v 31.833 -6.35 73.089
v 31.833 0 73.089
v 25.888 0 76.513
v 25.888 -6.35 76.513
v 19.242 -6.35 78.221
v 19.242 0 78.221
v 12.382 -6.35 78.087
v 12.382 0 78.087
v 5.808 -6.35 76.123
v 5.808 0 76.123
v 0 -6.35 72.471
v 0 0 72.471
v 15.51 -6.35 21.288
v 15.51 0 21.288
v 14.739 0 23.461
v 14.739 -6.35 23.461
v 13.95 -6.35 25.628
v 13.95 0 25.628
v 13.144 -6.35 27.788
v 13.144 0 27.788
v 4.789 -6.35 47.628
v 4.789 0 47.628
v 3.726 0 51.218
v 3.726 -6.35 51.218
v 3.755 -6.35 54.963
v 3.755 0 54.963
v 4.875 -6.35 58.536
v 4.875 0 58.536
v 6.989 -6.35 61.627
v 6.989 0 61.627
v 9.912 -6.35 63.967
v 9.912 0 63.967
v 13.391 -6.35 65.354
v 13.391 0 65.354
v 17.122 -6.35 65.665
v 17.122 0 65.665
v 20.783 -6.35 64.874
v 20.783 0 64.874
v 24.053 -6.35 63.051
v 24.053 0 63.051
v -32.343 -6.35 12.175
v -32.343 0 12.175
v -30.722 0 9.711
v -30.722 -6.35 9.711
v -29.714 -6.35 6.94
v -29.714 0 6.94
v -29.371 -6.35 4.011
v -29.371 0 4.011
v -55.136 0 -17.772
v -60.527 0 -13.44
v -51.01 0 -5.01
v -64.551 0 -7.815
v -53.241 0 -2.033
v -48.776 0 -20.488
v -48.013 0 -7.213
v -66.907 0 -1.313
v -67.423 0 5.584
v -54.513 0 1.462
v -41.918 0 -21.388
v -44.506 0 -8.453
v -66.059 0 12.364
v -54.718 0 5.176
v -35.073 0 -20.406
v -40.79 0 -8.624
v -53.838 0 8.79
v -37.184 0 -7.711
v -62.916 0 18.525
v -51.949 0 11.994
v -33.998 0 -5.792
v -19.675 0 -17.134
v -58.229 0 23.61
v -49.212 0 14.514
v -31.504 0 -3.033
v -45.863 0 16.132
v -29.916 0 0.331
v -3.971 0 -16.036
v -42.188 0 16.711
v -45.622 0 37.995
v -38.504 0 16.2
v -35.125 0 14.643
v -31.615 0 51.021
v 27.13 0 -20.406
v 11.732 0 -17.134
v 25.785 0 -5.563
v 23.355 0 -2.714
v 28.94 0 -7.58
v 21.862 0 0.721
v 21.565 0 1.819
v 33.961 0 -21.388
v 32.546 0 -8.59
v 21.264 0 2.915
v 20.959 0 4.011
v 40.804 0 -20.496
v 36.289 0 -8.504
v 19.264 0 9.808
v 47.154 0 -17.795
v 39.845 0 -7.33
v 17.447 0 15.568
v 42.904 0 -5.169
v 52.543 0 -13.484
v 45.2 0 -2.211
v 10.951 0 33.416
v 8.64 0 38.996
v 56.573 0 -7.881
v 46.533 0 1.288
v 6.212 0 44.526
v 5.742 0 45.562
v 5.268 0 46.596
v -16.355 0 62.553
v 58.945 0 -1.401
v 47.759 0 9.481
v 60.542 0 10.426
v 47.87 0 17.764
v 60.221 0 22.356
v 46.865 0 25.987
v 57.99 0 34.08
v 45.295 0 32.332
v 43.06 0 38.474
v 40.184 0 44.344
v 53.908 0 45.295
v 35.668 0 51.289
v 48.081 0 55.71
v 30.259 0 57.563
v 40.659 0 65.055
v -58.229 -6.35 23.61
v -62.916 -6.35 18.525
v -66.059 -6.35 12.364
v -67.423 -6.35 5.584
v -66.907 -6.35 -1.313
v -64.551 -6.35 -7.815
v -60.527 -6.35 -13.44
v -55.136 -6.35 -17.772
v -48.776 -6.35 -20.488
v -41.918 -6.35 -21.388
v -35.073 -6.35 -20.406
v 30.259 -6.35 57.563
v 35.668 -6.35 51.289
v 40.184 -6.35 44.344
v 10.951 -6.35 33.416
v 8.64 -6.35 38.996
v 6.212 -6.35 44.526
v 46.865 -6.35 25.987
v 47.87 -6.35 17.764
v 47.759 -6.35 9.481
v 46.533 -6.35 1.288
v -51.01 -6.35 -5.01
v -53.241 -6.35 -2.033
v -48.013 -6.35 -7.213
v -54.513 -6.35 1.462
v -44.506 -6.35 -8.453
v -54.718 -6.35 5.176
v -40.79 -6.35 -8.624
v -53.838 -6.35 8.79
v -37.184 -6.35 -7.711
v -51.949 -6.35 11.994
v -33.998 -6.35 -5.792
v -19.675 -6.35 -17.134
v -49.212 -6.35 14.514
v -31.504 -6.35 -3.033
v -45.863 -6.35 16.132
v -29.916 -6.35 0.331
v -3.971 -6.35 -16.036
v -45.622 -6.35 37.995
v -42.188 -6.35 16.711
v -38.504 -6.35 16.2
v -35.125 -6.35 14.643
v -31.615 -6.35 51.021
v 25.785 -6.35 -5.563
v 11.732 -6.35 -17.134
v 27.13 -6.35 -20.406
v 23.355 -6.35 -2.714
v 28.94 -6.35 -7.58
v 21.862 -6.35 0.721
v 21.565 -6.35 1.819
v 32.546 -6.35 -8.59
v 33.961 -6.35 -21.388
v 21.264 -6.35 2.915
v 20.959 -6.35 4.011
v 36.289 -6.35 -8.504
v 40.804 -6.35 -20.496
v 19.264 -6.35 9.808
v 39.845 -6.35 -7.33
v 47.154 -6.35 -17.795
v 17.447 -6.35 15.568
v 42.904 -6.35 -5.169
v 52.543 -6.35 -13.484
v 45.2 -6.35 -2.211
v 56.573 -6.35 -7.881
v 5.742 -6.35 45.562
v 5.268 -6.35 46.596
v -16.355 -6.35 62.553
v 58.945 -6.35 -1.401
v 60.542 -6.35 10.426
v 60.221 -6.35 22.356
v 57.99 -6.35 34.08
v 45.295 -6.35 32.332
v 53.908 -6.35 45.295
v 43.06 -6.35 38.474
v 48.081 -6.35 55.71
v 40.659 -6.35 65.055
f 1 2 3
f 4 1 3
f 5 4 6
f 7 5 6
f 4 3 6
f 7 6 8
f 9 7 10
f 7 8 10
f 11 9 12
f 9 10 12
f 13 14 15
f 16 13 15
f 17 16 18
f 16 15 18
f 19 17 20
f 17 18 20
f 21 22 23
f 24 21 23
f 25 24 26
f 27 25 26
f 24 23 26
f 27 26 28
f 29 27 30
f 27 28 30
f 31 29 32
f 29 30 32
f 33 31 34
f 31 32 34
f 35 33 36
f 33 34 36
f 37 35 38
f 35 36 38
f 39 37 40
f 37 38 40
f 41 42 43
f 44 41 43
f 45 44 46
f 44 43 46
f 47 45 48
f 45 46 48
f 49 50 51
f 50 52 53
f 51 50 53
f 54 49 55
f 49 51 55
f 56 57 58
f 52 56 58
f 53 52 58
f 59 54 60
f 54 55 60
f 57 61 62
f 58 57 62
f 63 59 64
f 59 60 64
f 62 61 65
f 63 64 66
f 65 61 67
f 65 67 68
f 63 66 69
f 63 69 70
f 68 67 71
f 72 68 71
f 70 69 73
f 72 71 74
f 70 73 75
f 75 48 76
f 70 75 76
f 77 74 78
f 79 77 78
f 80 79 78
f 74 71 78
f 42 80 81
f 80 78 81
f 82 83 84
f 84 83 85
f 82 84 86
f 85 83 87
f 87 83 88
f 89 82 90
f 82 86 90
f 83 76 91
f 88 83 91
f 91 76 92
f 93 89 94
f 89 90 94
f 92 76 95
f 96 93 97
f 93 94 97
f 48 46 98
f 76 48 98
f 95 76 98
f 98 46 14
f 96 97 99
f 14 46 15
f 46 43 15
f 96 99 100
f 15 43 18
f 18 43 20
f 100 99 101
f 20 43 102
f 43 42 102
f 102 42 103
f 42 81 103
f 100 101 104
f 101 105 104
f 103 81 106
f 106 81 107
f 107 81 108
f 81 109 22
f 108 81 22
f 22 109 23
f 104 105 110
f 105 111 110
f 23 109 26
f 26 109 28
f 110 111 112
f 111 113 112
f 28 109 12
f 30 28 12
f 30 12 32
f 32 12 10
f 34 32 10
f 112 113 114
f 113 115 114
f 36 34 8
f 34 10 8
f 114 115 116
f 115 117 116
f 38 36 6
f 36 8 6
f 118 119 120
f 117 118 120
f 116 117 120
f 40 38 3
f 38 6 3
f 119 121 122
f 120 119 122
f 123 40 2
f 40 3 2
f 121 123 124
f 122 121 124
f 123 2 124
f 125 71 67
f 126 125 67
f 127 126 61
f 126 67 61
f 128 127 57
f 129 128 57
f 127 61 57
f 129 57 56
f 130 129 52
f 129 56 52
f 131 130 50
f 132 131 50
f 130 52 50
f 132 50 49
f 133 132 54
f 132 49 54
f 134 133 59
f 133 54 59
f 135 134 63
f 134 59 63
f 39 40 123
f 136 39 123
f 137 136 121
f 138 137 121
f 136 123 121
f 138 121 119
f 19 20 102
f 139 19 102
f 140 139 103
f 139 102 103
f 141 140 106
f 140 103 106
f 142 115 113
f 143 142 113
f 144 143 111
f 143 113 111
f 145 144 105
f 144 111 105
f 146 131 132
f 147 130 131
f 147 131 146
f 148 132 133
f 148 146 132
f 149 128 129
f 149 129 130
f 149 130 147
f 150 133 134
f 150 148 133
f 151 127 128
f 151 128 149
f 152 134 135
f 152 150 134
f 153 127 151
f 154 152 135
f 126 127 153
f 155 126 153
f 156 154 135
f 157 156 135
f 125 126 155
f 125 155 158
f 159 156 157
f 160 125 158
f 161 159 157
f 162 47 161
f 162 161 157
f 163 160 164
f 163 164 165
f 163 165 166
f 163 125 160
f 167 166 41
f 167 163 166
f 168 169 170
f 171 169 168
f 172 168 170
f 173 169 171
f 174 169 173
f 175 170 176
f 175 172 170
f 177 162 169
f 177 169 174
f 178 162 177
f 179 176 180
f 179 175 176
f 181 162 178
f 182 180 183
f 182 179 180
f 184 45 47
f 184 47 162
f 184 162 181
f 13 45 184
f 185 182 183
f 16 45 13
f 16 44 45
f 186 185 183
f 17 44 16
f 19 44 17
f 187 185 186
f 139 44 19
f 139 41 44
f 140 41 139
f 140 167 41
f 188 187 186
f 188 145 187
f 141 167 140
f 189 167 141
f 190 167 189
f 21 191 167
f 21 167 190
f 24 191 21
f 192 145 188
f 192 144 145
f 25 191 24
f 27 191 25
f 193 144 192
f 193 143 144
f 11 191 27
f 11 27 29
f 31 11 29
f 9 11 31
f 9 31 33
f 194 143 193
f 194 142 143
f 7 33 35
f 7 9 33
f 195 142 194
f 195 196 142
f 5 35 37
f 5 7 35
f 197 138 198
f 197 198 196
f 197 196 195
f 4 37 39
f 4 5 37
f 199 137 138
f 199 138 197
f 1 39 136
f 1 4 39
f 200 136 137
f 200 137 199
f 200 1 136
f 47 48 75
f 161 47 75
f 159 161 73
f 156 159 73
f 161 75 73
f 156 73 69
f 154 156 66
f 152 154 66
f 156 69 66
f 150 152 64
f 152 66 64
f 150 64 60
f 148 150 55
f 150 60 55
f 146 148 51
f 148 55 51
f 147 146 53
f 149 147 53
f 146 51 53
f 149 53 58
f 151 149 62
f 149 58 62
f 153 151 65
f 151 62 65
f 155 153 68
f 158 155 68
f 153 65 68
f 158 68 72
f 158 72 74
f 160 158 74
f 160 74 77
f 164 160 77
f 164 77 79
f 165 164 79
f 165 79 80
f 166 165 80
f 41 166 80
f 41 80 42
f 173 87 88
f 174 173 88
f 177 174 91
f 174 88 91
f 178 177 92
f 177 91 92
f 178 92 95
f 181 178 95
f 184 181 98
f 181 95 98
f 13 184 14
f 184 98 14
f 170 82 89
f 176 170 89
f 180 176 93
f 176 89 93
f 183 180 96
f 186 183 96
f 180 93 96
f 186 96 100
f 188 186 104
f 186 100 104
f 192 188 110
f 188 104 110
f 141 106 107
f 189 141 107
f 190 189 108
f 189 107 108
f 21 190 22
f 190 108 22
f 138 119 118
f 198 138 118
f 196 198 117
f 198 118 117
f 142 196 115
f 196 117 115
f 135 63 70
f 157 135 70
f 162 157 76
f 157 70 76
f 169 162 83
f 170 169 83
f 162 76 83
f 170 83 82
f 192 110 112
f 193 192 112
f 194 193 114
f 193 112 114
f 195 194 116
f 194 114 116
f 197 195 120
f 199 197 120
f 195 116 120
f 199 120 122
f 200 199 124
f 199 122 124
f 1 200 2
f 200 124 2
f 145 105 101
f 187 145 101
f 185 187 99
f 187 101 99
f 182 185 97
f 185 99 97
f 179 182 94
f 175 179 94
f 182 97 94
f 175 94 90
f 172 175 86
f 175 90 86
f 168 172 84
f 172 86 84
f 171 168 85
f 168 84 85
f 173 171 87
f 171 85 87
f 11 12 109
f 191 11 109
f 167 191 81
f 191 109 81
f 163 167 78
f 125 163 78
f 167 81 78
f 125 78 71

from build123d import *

# Parameters (mm, degrees)
F1_DEPTH = 6.35


with BuildPart() as f1:
    # F0 (on Front) → F1 (new body)
    with BuildSketch(Plane.XZ):
        with BuildLine():
            ThreePointArc((0, 72.4705681205), (-31.6151754834, 51.0205932538), (-58.2285185052, 23.6098158874))
            ThreePointArc((-58.2285185052, 23.6098158874), (-39.747753506, 29.3045872421), (-22.6139344783, 20.3379077418))
            Line((-22.6139344783, 20.3379077418), (-3.1564056231, 36.6647130278))
            ThreePointArc((-3.1564056231, 36.6647130278), (-9.0007564313, 55.2219634474), (0, 72.4705681205))
        make_face()
        with BuildLine():
            Line((-3.1564056231, 36.6647130278), (-22.6139344783, 20.3379077418))
            ThreePointArc((-22.6139344783, 20.3379077418), (-18.2032707655, 12.6984140962), (-16.6714633335, 4.0111024557))
            Line((-16.6714633335, 4.0111024557), (8.7285366665, 4.0111024557))
            ThreePointArc((8.7285366665, 4.0111024557), (8.7325019345, 4.4599007306), (8.7443965005, 4.908558879))
            ThreePointArc((8.7443965005, 4.908558879), (6.1125631722, 21.5486538709), (-2.5673824162, 35.9874160266))
            ThreePointArc((-2.5673824162, 35.9874160266), (-2.8648860812, 36.3234624284), (-3.1564056231, 36.6647130278))
        make_face()
        with BuildLine():
            ThreePointArc((-16.6714633335, 4.0111024557), (-21.7868505138, -11.2759666798), (-35.0726037079, -20.4056123917))
            ThreePointArc((-35.0726037079, -20.4056123917), (-3.9714633335, -16.0361449079), (27.129677041, -20.4056123917))
            ThreePointArc((27.129677041, -20.4056123917), (13.8439238468, -11.2759666798), (8.7285366665, 4.0111024557))
            Line((8.7285366665, 4.0111024557), (-16.6714633335, 4.0111024557))
        make_face()
        with BuildLine():
            ThreePointArc((58.9453417467, -1.4005687843), (56.1752899305, 39.7699962571), (31.833343639, 73.0890338128))
            ThreePointArc((31.833343639, 73.0890338128), (39.10110567, 64.1861956577), (41.7011232322, 52.9915183138))
            ThreePointArc((41.7011232322, 52.9915183138), (41.3188749847, 48.6015186275), (40.18363526, 44.3436504125))
            ThreePointArc((40.18363526, 44.3436504125), (44.2593671036, 35.4329550343), (46.8648599559, 25.9871364261))
            ThreePointArc((46.8648599559, 25.9871364261), (56.1360650551, 16.6929278064), (59.5285366665, 4.0111024557))
            ThreePointArc((59.5285366665, 4.0111024557), (59.382317067, 1.2896000248), (58.9453417467, -1.4005687843))
        make_face()
        with BuildLine():
            ThreePointArc((31.833343639, 73.0890338128), (15.8077391608, 78.3867259751), (0, 72.4705681205))
            ThreePointArc((0, 72.4705681205), (-9.0007564313, 55.2219634474), (-3.1564056231, 36.6647130278))
            Line((-3.1564056231, 36.6647130278), (6.2123223295, 44.5260091974))
            ThreePointArc((6.2123223295, 44.5260091974), (5.5055073041, 46.0788928649), (4.789482931, 47.627551724))
            ThreePointArc((4.789482931, 47.627551724), (8.3636814796, 62.9054992713), (24.0534690987, 63.0508986907))
            ThreePointArc((24.0534690987, 63.0508986907), (33.0695475347, 54.5172622309), (40.18363526, 44.3436504125))
            ThreePointArc((40.18363526, 44.3436504125), (41.3188749847, 48.6015186275), (41.7011232322, 52.9915183138))
            ThreePointArc((41.7011232322, 52.9915183138), (39.10110567, 64.1861956577), (31.833343639, 73.0890338128))
        make_face()
        with BuildLine():
            ThreePointArc((8.7285366665, 4.0111024557), (13.8439238468, -11.2759666798), (27.129677041, -20.4056123917))
            ThreePointArc((27.129677041, -20.4056123917), (47.1541927224, -17.794683114), (58.9453417467, -1.4005687843))
            ThreePointArc((58.9453417467, -1.4005687843), (59.382317067, 1.2896000248), (59.5285366665, 4.0111024557))
            ThreePointArc((59.5285366665, 4.0111024557), (56.1360650551, 16.6929278064), (46.8648599559, 25.9871364261))
            ThreePointArc((46.8648599559, 25.9871364261), (47.9546242088, 13.6208501821), (46.533223206, 1.2882818858))
            ThreePointArc((46.533223206, 1.2882818858), (34.4206876415, -8.6855367771), (21.8622173199, 0.7205995022))
            ThreePointArc((21.8622173199, 0.7205995022), (21.4152650858, 2.3671926108), (20.9585424275, 4.0111024557))
            Line((20.9585424275, 4.0111024557), (8.7285366665, 4.0111024557))
        make_face()
        with BuildLine():
            ThreePointArc((8.7443965005, 4.908558879), (8.7325019345, 4.4599007306), (8.7285366665, 4.0111024557))
            Line((8.7285366665, 4.0111024557), (20.9585424275, 4.0111024557))
            ThreePointArc((20.9585424275, 4.0111024557), (18.3704105721, 12.6927036587), (15.509855789, 21.2883916639))
            ThreePointArc((15.509855789, 21.2883916639), (10.6522338174, 13.7076587794), (8.7443965005, 4.908558879))
        make_face()
        with BuildLine():
            Line((6.2123223295, 44.5260091974), (-3.1564056231, 36.6647130278))
            ThreePointArc((-3.1564056231, 36.6647130278), (-2.8648860812, 36.3234624284), (-2.5673824162, 35.9874160266))
            ThreePointArc((-2.5673824162, 35.9874160266), (4.5500581511, 30.4732486321), (13.1440136398, 27.788489547))
            ThreePointArc((13.1440136398, 27.788489547), (9.8101239891, 36.2118977495), (6.2123223295, 44.5260091974))
        make_face()
        with BuildLine():
            ThreePointArc((13.1440136398, 27.788489547), (4.5500581511, 30.4732486321), (-2.5673824162, 35.9874160266))
            ThreePointArc((-2.5673824162, 35.9874160266), (6.1125631722, 21.5486538709), (8.7443965005, 4.908558879))
            ThreePointArc((8.7443965005, 4.908558879), (10.6522338174, 13.7076587794), (15.509855789, 21.2883916639))
            ThreePointArc((15.509855789, 21.2883916639), (14.3464977034, 24.5455609512), (13.1440136398, 27.788489547))
        make_face()
        with BuildLine():
            ThreePointArc((-22.6139344783, 20.3379077418), (-39.747753506, 29.3045872421), (-58.2285185052, 23.6098158874))
            ThreePointArc((-58.2285185052, 23.6098158874), (-64.5505117579, -7.8148174635), (-35.0726037079, -20.4056123917))
            ThreePointArc((-35.0726037079, -20.4056123917), (-21.7868505138, -11.2759666798), (-16.6714633335, 4.0111024557))
            Line((-16.6714633335, 4.0111024557), (-29.3714633335, 4.0111024557))
            ThreePointArc((-29.3714633335, 4.0111024557), (-54.0055596175, -0.3325533645), (-32.3426989059, 12.1745050987))
            Line((-32.3426989059, 12.1745050987), (-22.6139344783, 20.3379077418))
        make_face()
        with BuildLine():
            ThreePointArc((-16.6714633335, 4.0111024557), (-18.2032707655, 12.6984140962), (-22.6139344783, 20.3379077418))
            Line((-22.6139344783, 20.3379077418), (-32.3426989059, 12.1745050987))
            ThreePointArc((-32.3426989059, 12.1745050987), (-30.1373670495, 8.354758276), (-29.3714633335, 4.0111024557))
            Line((-29.3714633335, 4.0111024557), (-16.6714633335, 4.0111024557))
        make_face()
    extrude(amount=F1_DEPTH)


solid = f1.part
